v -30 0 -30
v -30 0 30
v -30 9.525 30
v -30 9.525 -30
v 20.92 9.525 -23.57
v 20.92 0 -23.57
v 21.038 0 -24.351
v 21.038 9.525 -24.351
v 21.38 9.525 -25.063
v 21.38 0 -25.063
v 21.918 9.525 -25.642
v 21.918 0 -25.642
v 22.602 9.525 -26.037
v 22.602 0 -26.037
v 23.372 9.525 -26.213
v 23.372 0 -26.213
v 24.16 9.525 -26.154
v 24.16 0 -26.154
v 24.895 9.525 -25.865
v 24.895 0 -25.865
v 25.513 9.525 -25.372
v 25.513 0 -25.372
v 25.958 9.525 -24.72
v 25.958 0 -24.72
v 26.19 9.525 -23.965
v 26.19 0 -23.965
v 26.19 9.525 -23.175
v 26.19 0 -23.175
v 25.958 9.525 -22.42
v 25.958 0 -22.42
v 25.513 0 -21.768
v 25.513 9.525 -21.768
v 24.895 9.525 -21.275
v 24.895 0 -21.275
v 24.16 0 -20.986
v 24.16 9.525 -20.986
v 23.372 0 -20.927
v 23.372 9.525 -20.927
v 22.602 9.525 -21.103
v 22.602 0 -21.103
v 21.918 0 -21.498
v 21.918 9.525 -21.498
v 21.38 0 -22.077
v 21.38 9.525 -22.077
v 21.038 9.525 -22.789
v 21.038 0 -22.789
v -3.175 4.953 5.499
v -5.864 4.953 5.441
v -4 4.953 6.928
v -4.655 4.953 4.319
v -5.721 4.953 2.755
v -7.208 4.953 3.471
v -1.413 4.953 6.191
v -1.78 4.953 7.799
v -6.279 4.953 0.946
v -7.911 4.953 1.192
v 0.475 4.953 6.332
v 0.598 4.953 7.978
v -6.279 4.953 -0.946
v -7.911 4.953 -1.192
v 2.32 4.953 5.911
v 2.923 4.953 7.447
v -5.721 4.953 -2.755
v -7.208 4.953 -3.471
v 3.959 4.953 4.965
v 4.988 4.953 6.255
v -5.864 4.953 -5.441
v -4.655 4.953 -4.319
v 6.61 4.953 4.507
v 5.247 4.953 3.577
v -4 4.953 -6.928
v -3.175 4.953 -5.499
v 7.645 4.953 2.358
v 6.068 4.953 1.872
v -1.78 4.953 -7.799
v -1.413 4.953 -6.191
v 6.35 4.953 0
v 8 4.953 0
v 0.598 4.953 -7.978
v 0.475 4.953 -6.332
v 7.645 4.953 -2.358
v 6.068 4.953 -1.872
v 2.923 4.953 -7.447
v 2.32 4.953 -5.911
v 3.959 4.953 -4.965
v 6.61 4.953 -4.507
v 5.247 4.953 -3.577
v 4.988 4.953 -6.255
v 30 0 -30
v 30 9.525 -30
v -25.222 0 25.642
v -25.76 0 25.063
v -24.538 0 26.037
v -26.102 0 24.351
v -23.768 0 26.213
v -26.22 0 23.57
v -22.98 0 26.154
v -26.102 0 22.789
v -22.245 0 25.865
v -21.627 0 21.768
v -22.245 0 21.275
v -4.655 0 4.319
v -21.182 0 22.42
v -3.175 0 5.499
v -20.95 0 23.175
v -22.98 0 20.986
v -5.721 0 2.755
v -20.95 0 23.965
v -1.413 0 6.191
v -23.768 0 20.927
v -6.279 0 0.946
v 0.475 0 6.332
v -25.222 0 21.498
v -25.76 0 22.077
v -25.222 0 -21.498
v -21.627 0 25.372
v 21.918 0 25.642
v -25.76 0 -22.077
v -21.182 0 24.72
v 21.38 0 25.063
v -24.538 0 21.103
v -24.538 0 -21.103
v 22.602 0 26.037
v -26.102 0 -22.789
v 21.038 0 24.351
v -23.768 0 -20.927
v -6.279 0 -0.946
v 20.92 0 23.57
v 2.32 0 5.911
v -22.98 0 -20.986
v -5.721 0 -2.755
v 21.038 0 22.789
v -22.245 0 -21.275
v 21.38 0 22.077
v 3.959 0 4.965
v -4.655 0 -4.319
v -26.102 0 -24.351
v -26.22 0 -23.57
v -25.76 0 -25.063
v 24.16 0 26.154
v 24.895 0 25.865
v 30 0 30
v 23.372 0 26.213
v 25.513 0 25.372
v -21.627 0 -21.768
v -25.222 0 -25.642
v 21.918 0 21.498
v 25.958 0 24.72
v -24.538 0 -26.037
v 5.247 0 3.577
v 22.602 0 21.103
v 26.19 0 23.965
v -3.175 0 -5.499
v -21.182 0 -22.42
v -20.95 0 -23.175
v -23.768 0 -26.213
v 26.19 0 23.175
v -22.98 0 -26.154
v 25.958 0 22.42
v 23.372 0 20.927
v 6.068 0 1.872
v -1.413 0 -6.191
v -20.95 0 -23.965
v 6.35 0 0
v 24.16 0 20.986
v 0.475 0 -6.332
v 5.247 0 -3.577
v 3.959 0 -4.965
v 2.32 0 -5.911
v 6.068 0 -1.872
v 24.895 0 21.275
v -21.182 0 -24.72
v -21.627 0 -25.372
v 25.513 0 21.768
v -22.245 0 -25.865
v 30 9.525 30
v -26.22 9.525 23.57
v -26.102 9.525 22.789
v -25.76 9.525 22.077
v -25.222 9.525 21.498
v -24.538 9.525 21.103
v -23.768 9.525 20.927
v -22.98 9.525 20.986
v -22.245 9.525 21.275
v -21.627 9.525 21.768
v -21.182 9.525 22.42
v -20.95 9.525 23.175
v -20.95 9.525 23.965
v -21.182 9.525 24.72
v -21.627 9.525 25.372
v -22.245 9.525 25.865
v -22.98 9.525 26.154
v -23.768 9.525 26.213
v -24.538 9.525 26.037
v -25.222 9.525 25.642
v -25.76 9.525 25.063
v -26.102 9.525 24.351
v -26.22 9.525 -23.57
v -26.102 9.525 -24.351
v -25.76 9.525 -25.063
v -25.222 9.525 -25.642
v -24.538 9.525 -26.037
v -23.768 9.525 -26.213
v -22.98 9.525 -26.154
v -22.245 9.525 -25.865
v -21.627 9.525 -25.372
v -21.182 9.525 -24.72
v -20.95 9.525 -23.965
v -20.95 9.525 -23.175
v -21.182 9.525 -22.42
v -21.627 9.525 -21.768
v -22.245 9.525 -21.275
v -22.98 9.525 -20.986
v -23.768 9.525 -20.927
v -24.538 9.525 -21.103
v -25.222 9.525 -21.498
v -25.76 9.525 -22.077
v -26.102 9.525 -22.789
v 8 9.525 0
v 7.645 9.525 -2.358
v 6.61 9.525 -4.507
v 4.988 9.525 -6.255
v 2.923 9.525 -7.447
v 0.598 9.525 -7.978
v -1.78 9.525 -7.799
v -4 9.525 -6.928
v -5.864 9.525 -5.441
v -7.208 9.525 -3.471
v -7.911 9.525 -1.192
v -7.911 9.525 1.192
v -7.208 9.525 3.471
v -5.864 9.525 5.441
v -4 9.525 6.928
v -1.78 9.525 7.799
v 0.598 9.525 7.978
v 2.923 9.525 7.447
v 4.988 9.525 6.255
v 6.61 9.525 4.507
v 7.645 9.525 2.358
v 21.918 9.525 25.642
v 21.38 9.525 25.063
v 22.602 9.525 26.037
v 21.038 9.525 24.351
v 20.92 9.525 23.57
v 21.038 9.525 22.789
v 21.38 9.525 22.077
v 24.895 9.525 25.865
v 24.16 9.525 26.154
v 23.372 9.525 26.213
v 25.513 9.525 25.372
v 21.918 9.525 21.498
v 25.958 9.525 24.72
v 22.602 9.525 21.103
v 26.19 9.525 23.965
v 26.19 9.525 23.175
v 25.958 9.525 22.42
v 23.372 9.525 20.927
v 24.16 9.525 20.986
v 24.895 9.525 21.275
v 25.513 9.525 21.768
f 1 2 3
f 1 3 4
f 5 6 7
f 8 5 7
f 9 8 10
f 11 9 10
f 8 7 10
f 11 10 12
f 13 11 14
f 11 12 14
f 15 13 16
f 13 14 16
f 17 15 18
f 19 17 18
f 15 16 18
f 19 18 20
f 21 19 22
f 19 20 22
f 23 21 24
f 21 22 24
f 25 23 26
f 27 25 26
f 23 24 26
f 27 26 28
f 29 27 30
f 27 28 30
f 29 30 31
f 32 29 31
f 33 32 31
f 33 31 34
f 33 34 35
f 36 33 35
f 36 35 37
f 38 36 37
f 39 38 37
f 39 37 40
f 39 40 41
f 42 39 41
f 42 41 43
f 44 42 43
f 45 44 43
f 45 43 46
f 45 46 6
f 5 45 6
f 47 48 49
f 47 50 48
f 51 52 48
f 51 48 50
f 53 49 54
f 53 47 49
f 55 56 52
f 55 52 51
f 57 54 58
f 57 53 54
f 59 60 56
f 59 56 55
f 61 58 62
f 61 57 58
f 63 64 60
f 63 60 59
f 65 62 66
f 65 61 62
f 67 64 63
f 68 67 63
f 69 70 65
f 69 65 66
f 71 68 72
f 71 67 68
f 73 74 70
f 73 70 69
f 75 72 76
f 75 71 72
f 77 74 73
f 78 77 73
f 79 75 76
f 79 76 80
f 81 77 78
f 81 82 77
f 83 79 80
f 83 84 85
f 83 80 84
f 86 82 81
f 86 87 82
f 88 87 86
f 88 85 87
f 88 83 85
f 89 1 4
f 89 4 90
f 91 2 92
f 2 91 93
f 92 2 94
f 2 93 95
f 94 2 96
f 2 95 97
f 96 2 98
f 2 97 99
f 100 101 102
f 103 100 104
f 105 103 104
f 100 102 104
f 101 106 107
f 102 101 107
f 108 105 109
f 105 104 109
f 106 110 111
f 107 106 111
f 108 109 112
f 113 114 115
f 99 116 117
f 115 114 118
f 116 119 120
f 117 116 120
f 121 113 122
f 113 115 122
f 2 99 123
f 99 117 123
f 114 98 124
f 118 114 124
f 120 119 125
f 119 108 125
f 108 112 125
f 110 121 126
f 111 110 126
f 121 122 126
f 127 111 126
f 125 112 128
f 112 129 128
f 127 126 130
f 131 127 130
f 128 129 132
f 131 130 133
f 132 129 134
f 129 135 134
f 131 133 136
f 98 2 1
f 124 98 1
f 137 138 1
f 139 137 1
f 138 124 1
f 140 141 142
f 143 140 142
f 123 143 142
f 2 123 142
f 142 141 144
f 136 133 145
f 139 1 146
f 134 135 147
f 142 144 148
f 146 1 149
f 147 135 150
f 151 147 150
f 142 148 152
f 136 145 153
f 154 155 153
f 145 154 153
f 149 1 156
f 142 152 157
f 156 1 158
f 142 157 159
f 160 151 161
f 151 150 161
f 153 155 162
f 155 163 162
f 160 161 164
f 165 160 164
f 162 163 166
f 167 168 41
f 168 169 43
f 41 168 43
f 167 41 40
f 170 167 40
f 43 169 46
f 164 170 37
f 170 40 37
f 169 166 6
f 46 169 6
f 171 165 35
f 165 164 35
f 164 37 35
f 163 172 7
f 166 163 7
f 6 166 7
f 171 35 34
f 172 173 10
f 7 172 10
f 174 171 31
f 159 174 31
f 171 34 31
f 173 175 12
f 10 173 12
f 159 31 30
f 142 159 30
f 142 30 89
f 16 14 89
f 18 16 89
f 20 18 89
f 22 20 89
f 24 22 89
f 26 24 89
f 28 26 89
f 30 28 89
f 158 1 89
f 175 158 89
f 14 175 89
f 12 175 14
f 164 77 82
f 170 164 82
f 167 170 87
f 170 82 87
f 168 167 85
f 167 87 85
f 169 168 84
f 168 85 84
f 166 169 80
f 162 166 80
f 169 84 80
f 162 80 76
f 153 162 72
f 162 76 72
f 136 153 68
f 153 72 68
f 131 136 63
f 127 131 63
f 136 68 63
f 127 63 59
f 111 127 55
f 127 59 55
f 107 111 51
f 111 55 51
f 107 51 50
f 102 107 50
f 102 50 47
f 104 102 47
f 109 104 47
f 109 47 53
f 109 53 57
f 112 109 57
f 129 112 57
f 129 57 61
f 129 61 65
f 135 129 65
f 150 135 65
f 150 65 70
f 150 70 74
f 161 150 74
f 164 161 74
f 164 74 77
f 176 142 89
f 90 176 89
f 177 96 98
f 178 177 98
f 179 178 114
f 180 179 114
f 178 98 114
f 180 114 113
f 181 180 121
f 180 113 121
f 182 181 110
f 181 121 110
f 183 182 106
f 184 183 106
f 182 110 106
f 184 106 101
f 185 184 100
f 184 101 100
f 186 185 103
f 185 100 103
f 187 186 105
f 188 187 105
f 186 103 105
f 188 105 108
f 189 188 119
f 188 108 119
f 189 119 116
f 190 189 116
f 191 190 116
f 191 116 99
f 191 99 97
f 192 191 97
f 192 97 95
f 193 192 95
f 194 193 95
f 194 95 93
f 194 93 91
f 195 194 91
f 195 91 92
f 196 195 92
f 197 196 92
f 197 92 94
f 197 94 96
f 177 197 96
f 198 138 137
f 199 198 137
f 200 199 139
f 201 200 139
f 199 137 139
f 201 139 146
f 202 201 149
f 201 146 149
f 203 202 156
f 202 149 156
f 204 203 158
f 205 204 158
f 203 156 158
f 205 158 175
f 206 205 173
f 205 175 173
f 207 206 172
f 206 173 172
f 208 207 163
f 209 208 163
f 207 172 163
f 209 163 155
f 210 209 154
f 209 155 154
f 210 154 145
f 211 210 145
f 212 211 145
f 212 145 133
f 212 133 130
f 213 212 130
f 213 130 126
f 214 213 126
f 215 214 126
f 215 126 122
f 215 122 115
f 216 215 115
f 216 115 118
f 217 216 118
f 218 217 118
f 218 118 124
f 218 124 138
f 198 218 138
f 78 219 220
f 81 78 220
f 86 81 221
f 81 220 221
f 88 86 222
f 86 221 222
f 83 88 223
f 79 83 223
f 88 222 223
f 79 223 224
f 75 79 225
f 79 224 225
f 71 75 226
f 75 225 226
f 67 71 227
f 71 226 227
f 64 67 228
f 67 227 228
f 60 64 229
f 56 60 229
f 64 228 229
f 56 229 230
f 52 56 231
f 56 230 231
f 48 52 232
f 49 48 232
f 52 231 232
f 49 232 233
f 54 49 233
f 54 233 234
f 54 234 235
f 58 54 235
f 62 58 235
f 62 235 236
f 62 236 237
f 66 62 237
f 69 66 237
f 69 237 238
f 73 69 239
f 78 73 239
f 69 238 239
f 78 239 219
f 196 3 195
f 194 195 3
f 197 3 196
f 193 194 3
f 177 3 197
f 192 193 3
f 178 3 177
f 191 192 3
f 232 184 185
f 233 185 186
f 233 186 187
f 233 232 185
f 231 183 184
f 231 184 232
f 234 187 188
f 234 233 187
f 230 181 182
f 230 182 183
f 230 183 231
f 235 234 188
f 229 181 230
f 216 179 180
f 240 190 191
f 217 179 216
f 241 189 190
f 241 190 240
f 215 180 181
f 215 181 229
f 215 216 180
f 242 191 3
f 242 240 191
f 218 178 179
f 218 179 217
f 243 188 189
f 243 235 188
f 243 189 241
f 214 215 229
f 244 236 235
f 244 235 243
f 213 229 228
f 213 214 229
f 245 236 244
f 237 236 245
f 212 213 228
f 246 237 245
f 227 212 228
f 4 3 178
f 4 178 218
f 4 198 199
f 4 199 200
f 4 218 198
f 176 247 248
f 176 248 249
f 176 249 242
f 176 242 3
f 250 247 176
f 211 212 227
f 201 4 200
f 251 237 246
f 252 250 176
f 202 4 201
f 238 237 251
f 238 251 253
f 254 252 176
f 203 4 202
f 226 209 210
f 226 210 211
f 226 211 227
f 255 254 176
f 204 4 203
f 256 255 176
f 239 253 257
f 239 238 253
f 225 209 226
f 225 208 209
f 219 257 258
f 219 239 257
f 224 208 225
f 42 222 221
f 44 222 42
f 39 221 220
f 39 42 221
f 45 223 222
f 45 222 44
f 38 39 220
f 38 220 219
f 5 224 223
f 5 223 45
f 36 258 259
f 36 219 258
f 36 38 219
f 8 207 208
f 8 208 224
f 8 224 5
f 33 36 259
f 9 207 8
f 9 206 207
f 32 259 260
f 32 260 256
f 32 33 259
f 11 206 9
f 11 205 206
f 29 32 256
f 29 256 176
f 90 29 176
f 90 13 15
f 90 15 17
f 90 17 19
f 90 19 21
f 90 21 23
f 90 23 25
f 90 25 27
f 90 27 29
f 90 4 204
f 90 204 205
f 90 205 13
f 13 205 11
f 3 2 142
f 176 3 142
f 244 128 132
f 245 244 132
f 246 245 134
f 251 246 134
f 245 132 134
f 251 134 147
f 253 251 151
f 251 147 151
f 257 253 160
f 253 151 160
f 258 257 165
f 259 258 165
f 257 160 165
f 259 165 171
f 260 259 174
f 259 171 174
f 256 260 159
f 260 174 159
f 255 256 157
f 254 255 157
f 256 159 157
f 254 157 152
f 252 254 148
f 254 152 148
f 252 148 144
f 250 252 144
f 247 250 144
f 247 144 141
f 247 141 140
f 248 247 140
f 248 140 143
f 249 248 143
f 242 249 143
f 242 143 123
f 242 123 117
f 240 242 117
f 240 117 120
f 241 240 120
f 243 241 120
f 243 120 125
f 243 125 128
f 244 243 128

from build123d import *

# Parameters (mm, degrees)
SKETCH1_W            = 60
SKETCH1_H            = 60
BOSS_EXTRUDE1_DEPTH  = 9.525
M5_CLEARANCE_HOLE1_D = 5.3
SKETCH5_R            = 8
CUT_EXTRUDE1_DEPTH   = 4.572
SKETCH6_R            = 6.35
CUT_EXTRUDE2_DEPTH   = 5.953


with BuildPart() as part:
    # Sketch1 → Boss-Extrude1 (new body)
    with BuildSketch(Plane(origin=(0, 0, 0), x_dir=(1, 0, 0), z_dir=(0, 1, 0))):
        Rectangle(SKETCH1_W, SKETCH1_H)
    extrude(amount=BOSS_EXTRUDE1_DEPTH)

    # M5 Clearance Hole1 (through all)
    with Locations(Plane(origin=(0, 9.525, 0), x_dir=(1, 0, 0), z_dir=(0, 1, 0))):
        with Locations((-23.57, 23.57), (23.57, 23.57), (23.57, -23.57), (-23.57, -23.57)):
            Hole(M5_CLEARANCE_HOLE1_D / 2)

    # Sketch5 → Cut-Extrude1 (cut)
    with BuildSketch(Plane(origin=(0, 9.525, 0), x_dir=(1, 0, 0), z_dir=(0, 1, 0))):
        Circle(SKETCH5_R)
    extrude(amount=-CUT_EXTRUDE1_DEPTH, mode=Mode.SUBTRACT)

    # Sketch6 → Cut-Extrude2 (cut, through all)
    with BuildSketch(Plane(origin=(0, 4.953, 0), x_dir=(1, 0, 0), z_dir=(0, 1, 0))):
        Circle(SKETCH6_R)
    extrude(amount=-CUT_EXTRUDE2_DEPTH, mode=Mode.SUBTRACT)


solid = part.part
